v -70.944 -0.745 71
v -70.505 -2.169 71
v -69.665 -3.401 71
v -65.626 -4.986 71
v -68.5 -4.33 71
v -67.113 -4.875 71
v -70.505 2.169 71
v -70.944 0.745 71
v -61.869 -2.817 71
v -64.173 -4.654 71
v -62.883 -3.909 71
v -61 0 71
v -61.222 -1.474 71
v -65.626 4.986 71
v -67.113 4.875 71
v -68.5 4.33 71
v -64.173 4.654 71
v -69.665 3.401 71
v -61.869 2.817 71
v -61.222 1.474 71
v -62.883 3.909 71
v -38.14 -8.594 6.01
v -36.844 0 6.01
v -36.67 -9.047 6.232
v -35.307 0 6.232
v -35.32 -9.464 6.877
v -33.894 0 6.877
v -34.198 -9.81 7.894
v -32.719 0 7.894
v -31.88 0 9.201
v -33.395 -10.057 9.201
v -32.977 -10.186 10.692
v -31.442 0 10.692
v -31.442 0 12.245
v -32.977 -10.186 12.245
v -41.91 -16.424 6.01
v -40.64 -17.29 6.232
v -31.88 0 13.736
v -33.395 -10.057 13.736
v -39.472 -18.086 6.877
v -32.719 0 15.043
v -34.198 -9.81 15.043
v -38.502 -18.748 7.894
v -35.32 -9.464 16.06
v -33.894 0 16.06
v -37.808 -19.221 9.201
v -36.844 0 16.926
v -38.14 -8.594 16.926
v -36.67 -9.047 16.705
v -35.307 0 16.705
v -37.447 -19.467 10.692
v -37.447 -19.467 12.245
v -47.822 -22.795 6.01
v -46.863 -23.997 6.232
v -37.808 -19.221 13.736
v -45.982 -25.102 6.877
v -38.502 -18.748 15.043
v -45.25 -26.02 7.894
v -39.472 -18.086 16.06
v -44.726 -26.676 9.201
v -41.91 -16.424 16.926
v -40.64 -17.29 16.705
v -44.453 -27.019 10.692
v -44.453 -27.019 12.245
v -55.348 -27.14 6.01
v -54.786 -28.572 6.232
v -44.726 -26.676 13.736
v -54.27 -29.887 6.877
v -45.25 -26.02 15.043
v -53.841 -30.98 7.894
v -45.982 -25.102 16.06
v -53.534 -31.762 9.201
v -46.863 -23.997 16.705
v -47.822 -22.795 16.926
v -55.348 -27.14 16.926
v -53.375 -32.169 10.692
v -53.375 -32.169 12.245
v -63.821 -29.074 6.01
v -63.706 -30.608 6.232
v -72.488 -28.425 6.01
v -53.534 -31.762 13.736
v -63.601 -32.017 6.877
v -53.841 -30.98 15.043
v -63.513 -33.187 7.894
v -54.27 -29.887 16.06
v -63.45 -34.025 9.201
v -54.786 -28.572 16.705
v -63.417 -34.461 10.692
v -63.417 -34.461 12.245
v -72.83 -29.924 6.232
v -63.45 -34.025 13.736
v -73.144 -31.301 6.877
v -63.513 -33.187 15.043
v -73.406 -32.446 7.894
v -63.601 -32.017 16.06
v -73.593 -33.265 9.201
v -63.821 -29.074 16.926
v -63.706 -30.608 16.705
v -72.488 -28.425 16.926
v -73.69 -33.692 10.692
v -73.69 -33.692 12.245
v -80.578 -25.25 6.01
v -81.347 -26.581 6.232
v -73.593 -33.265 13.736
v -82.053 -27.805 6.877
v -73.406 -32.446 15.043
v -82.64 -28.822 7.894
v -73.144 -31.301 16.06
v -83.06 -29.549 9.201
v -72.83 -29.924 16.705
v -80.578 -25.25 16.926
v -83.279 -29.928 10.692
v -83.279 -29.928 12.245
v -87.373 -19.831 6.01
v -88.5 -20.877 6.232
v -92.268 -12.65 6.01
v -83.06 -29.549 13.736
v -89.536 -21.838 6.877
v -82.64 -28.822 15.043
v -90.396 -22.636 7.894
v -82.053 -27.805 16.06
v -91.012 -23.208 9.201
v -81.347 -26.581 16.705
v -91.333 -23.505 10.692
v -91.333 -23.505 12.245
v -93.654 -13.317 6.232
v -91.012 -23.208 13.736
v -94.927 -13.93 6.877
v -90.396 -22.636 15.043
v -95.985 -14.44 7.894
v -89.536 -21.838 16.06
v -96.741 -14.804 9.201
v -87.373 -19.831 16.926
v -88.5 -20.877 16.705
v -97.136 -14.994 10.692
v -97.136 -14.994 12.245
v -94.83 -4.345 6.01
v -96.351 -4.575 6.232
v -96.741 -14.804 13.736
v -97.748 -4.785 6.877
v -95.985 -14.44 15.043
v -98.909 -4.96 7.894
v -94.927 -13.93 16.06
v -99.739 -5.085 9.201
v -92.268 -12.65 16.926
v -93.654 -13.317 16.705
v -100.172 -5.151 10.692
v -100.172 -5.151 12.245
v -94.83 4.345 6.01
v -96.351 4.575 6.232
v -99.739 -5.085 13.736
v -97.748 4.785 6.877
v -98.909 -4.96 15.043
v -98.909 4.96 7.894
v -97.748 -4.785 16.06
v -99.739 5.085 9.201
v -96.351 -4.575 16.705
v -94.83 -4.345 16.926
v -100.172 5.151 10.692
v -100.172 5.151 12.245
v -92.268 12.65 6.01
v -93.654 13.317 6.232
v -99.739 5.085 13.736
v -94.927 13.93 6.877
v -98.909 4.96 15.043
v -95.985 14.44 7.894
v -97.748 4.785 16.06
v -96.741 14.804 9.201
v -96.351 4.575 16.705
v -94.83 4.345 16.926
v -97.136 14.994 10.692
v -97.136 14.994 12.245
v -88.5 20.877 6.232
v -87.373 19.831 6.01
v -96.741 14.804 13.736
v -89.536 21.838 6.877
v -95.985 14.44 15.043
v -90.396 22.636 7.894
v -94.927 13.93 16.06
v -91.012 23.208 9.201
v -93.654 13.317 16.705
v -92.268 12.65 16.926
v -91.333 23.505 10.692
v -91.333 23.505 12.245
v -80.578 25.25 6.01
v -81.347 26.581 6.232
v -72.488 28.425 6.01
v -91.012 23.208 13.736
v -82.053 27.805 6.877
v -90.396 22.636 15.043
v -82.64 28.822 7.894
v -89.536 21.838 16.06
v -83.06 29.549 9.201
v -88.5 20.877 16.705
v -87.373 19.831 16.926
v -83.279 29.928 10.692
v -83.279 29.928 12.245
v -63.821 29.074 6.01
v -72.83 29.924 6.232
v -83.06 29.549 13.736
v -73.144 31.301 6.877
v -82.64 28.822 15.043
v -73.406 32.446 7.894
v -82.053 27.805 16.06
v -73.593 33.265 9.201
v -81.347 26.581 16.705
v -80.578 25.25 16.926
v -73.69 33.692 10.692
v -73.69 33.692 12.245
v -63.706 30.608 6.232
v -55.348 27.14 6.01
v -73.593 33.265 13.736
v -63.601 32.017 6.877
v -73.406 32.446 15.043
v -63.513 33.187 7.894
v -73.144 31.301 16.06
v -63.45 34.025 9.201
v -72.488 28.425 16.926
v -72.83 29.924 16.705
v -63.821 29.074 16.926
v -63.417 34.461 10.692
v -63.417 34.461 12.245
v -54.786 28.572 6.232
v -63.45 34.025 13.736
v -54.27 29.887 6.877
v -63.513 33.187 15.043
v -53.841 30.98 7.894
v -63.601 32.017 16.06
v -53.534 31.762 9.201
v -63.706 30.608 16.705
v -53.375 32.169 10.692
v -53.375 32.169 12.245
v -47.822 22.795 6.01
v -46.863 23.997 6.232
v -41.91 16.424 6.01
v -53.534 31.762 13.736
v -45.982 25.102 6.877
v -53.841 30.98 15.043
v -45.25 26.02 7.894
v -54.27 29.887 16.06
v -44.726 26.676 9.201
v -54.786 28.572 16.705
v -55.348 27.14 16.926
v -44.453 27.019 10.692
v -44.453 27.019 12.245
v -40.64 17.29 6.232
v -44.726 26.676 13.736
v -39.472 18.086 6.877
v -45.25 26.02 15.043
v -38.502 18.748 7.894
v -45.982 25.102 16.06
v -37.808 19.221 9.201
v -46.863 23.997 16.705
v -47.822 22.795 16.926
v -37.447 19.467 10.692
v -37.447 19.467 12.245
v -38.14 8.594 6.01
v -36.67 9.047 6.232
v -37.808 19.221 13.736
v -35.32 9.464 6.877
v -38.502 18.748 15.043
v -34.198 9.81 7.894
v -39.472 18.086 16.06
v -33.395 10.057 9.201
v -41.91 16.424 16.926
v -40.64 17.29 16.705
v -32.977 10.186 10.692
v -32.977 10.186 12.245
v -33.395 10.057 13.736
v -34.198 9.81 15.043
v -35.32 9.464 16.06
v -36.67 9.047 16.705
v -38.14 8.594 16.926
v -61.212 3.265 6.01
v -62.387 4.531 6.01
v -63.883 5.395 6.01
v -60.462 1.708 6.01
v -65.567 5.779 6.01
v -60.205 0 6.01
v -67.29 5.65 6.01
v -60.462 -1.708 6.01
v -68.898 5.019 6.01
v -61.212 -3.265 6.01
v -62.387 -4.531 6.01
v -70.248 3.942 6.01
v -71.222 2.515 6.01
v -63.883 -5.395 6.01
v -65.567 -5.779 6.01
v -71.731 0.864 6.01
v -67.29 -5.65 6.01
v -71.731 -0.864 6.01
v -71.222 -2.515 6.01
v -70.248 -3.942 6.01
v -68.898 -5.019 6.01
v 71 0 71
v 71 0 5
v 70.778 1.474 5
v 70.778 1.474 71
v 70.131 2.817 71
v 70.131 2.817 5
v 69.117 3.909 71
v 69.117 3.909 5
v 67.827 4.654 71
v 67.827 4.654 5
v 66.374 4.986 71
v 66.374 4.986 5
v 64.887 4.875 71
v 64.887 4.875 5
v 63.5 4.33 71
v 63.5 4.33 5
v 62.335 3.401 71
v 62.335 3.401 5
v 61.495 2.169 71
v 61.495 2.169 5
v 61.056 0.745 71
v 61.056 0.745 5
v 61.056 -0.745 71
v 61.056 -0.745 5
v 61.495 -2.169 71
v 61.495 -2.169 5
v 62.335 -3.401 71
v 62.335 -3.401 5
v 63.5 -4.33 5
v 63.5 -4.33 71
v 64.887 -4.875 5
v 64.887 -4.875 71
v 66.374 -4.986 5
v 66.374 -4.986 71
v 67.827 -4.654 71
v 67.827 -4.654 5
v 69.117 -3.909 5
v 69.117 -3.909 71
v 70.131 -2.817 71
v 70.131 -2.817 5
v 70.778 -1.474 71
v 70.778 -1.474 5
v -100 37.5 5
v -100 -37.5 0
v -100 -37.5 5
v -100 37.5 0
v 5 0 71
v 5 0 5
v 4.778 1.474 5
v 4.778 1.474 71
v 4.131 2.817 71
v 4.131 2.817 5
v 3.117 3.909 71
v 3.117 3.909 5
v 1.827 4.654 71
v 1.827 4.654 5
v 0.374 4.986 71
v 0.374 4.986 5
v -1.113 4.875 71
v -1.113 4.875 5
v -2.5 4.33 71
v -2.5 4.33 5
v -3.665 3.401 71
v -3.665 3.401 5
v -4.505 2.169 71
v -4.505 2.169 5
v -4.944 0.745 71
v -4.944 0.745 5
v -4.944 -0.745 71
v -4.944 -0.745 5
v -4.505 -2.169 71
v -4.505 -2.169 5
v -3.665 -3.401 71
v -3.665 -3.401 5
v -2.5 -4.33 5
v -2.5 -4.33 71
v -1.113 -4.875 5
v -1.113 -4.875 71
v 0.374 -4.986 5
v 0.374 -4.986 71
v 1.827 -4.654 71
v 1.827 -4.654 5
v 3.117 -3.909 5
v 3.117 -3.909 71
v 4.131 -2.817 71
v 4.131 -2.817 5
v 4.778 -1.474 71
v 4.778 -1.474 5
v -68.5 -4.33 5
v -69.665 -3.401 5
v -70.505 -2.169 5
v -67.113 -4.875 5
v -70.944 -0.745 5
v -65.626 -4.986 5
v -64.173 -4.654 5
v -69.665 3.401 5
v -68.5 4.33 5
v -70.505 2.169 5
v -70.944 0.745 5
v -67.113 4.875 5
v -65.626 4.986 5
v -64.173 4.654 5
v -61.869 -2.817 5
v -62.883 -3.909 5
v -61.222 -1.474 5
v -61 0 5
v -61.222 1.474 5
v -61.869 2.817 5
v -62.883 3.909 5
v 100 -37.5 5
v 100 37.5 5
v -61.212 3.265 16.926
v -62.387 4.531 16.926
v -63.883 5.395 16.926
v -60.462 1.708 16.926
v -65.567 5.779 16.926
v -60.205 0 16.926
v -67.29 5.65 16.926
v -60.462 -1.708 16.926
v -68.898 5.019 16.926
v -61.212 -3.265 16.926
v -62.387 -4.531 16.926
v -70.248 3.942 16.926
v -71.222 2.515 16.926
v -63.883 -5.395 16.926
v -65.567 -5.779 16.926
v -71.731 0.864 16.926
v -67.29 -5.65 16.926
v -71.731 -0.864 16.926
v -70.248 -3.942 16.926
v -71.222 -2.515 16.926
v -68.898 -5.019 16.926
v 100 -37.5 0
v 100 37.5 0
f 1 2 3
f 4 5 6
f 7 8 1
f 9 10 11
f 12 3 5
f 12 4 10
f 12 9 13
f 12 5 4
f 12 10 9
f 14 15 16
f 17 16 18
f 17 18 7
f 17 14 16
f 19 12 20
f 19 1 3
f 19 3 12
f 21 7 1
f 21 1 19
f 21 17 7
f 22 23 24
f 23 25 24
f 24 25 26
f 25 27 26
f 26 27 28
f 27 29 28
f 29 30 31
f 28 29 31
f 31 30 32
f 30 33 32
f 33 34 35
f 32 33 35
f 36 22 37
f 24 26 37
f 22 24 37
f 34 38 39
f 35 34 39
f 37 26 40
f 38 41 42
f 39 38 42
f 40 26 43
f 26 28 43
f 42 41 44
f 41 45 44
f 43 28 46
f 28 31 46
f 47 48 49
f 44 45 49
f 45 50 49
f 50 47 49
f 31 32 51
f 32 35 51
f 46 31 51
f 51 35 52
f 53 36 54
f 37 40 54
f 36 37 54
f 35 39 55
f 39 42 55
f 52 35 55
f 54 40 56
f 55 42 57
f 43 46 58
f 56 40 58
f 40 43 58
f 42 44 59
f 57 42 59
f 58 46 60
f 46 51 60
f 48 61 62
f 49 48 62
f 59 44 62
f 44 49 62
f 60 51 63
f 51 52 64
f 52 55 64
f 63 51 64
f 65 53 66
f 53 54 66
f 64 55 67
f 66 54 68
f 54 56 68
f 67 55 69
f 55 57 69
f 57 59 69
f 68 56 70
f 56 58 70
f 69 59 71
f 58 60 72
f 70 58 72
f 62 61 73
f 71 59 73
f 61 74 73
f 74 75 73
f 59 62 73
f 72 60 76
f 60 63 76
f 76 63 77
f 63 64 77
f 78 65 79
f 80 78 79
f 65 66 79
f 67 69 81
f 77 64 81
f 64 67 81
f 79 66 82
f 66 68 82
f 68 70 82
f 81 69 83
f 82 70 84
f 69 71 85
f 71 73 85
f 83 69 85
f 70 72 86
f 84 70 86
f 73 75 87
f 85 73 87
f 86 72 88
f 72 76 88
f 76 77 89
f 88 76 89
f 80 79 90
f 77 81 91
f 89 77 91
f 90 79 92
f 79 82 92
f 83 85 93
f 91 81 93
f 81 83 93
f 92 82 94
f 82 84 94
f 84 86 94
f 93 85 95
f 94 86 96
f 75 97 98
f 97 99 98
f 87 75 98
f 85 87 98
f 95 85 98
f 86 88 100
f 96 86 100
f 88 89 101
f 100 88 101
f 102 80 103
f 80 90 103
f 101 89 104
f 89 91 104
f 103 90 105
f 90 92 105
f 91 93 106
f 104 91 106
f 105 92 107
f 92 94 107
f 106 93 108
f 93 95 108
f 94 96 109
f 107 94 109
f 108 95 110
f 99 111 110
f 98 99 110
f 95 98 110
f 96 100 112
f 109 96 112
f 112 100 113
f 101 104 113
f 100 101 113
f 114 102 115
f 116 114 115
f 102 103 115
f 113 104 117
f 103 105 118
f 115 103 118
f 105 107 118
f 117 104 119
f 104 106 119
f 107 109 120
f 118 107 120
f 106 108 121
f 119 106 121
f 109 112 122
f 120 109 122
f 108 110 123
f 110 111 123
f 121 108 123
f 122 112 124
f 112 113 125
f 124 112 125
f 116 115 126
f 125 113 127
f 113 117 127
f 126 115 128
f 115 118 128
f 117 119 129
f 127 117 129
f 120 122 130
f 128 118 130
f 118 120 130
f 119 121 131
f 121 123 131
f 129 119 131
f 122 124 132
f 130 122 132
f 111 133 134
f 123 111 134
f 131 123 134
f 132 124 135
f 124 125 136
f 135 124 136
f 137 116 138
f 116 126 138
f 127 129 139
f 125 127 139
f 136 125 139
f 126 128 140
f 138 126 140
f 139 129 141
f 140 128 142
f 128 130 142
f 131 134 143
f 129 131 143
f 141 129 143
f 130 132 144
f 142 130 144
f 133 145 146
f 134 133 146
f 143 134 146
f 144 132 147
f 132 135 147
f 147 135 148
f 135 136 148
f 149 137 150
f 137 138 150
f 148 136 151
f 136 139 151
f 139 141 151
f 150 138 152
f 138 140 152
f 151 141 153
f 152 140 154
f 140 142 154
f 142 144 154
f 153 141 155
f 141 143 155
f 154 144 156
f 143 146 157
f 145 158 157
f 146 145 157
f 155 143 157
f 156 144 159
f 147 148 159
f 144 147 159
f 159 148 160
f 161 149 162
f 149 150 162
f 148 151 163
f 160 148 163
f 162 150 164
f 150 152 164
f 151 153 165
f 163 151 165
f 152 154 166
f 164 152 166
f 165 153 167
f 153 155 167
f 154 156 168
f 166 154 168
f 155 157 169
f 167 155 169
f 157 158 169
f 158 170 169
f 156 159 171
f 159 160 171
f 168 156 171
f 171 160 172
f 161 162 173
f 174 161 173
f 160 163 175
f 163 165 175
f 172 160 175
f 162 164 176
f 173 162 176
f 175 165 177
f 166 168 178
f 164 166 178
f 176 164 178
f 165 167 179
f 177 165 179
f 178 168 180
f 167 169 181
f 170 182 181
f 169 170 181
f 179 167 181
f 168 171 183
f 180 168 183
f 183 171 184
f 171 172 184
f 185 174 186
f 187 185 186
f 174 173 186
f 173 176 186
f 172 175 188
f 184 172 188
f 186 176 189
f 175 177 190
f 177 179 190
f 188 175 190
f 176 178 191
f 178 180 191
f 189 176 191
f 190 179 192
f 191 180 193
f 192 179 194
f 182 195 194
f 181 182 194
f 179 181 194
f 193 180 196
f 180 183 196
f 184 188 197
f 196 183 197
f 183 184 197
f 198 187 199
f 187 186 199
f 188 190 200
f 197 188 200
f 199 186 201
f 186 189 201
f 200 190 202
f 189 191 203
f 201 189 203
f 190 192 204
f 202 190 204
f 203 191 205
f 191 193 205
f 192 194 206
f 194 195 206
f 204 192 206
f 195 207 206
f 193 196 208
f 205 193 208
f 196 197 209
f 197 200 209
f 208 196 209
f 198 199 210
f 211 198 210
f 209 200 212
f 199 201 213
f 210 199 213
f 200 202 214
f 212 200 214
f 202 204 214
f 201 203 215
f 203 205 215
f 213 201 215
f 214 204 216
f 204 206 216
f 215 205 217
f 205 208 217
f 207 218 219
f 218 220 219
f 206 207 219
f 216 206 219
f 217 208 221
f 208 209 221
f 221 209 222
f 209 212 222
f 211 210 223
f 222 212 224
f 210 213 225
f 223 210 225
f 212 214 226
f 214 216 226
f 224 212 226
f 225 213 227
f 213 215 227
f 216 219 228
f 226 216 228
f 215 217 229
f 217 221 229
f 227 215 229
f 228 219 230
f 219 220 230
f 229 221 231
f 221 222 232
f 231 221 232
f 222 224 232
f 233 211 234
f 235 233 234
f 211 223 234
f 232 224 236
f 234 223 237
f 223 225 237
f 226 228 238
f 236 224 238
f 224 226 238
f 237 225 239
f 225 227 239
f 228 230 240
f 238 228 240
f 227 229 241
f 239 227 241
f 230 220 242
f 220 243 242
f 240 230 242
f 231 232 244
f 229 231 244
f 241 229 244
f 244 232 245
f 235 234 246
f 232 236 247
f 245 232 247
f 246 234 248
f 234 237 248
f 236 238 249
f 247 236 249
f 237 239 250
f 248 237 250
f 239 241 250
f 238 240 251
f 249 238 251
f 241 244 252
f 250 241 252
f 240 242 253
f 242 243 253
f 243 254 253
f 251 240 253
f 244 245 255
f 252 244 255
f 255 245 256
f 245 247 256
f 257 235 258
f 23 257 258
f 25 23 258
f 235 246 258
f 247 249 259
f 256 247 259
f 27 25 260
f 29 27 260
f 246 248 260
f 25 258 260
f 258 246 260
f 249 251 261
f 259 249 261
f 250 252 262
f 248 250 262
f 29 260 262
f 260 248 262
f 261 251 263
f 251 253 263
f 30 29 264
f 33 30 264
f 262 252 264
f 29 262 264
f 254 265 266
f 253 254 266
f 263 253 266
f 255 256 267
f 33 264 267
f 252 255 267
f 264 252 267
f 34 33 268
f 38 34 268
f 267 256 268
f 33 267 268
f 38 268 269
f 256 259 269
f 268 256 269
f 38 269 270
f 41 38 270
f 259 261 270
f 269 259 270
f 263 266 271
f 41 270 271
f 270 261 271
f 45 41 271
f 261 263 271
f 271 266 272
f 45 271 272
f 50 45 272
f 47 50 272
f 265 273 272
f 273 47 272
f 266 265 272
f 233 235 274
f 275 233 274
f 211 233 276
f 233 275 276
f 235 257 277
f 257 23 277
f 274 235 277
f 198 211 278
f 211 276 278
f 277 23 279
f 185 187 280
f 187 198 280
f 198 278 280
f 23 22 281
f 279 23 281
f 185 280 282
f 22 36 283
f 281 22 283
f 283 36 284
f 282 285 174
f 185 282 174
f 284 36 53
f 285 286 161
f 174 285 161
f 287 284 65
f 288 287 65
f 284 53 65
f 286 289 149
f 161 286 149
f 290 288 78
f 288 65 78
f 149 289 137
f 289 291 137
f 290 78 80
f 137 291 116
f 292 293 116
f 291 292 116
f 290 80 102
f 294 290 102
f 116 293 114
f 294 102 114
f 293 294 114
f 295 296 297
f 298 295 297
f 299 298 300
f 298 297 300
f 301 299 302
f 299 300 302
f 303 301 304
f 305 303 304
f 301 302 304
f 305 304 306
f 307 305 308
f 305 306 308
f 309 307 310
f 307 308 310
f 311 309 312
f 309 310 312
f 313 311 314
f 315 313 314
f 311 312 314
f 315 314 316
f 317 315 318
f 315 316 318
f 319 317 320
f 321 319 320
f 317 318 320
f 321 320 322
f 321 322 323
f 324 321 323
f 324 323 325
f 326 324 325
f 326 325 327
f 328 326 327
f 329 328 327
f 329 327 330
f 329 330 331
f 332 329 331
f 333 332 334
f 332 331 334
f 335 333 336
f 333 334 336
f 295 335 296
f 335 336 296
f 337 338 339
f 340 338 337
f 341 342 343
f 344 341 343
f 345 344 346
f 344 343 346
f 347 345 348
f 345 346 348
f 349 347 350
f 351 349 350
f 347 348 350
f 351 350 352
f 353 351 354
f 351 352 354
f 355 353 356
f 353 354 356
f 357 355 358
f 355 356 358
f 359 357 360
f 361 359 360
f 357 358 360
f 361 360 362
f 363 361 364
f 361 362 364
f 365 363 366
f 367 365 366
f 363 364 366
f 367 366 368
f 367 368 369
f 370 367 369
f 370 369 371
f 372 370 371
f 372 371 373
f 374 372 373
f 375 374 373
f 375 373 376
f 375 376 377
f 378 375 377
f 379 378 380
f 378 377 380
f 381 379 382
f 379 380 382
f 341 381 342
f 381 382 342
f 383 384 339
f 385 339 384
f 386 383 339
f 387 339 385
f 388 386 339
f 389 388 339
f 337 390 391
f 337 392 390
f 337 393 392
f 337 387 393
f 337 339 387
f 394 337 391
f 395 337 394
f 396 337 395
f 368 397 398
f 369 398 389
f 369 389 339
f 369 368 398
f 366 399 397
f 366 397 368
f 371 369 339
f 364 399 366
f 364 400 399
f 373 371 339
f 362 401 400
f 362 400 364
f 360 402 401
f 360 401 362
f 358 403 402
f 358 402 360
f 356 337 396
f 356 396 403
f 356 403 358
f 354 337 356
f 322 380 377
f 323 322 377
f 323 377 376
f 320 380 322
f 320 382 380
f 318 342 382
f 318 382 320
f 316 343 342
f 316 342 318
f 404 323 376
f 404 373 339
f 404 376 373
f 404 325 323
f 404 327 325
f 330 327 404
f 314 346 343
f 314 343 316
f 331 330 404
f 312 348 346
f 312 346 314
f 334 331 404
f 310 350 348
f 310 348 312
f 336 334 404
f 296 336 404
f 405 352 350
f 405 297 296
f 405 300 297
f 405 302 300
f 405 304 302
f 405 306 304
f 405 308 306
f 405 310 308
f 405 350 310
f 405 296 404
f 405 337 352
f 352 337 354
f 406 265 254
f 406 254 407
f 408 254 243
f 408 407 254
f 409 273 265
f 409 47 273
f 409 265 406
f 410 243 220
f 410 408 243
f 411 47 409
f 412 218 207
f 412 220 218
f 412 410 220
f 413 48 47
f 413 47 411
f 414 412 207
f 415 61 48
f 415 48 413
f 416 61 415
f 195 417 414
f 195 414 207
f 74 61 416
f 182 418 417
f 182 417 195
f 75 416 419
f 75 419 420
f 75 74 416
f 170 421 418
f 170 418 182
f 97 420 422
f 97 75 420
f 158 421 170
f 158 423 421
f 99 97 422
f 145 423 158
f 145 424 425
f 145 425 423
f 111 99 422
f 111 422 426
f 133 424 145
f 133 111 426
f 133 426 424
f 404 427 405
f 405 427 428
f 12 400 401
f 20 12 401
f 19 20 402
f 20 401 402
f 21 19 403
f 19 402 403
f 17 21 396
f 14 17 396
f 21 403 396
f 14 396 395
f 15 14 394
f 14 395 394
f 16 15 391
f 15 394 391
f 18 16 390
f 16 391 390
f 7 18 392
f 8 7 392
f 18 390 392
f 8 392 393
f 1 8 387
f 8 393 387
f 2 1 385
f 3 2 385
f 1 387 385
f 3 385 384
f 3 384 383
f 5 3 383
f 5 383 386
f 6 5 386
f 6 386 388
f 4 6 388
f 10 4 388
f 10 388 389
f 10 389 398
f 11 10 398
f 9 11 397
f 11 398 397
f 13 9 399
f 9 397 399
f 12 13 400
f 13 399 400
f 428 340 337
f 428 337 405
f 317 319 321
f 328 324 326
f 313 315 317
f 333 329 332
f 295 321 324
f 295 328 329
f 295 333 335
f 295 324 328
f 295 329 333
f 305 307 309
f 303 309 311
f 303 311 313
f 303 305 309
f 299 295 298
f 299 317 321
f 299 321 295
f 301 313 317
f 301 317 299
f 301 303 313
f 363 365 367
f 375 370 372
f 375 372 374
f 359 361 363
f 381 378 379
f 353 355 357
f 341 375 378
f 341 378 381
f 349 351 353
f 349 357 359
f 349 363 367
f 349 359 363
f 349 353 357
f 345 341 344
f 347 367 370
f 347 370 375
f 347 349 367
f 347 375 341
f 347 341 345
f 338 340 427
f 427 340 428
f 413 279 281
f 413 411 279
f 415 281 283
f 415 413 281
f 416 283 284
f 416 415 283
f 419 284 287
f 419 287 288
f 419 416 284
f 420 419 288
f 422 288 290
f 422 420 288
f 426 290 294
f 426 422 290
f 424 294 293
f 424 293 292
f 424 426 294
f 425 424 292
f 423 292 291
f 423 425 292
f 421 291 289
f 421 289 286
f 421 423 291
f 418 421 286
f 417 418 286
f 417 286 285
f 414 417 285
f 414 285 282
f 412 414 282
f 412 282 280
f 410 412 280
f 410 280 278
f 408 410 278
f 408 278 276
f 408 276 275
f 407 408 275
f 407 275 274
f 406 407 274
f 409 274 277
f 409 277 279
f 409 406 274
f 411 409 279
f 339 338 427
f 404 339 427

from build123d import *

# Parameters (mm, degrees)
F0_W     = 200
F0_H     = 75
F1_DEPTH = 5
F2_R     = 5
F3_DEPTH = 66
F5_W     = 23.3601592481
F5_H     = 10.9159611166


with BuildPart() as f1:
    # F0 (on Top) → F1 (new body)
    with BuildSketch(Plane.XY):
        Rectangle(F0_W, F0_H)
    extrude(amount=F1_DEPTH)

    # F2 (on face) → F3 (join)
    with BuildSketch(Plane.XY.offset(5)):
        Circle(F2_R)
        with Locations((-66, 0)):
            Circle(F2_R)
        with Locations((66, 0)):
            Circle(F2_R)
    extrude(amount=F3_DEPTH)


with BuildPart() as f6:
    # F5 (on offset) → F6 (revolve)
    with BuildSketch(Plane.XZ):
        with Locations((-48.5244300216, 11.4684421569)):
            Rectangle(F5_W, F5_H)
        with BuildLine():
            Line((-36.8443503976, 16.9264227152), (-36.8443503976, 6.0104615986))
            ThreePointArc((-36.8443503976, 6.0104615986), (-31.3863698393, 11.4684421569), (-36.8443503976, 16.9264227152))
        make_face()
    revolve(axis=Axis((-66, 0, 5), (0, 0, -1)))


solid = Compound([f1.part, f6.part])
